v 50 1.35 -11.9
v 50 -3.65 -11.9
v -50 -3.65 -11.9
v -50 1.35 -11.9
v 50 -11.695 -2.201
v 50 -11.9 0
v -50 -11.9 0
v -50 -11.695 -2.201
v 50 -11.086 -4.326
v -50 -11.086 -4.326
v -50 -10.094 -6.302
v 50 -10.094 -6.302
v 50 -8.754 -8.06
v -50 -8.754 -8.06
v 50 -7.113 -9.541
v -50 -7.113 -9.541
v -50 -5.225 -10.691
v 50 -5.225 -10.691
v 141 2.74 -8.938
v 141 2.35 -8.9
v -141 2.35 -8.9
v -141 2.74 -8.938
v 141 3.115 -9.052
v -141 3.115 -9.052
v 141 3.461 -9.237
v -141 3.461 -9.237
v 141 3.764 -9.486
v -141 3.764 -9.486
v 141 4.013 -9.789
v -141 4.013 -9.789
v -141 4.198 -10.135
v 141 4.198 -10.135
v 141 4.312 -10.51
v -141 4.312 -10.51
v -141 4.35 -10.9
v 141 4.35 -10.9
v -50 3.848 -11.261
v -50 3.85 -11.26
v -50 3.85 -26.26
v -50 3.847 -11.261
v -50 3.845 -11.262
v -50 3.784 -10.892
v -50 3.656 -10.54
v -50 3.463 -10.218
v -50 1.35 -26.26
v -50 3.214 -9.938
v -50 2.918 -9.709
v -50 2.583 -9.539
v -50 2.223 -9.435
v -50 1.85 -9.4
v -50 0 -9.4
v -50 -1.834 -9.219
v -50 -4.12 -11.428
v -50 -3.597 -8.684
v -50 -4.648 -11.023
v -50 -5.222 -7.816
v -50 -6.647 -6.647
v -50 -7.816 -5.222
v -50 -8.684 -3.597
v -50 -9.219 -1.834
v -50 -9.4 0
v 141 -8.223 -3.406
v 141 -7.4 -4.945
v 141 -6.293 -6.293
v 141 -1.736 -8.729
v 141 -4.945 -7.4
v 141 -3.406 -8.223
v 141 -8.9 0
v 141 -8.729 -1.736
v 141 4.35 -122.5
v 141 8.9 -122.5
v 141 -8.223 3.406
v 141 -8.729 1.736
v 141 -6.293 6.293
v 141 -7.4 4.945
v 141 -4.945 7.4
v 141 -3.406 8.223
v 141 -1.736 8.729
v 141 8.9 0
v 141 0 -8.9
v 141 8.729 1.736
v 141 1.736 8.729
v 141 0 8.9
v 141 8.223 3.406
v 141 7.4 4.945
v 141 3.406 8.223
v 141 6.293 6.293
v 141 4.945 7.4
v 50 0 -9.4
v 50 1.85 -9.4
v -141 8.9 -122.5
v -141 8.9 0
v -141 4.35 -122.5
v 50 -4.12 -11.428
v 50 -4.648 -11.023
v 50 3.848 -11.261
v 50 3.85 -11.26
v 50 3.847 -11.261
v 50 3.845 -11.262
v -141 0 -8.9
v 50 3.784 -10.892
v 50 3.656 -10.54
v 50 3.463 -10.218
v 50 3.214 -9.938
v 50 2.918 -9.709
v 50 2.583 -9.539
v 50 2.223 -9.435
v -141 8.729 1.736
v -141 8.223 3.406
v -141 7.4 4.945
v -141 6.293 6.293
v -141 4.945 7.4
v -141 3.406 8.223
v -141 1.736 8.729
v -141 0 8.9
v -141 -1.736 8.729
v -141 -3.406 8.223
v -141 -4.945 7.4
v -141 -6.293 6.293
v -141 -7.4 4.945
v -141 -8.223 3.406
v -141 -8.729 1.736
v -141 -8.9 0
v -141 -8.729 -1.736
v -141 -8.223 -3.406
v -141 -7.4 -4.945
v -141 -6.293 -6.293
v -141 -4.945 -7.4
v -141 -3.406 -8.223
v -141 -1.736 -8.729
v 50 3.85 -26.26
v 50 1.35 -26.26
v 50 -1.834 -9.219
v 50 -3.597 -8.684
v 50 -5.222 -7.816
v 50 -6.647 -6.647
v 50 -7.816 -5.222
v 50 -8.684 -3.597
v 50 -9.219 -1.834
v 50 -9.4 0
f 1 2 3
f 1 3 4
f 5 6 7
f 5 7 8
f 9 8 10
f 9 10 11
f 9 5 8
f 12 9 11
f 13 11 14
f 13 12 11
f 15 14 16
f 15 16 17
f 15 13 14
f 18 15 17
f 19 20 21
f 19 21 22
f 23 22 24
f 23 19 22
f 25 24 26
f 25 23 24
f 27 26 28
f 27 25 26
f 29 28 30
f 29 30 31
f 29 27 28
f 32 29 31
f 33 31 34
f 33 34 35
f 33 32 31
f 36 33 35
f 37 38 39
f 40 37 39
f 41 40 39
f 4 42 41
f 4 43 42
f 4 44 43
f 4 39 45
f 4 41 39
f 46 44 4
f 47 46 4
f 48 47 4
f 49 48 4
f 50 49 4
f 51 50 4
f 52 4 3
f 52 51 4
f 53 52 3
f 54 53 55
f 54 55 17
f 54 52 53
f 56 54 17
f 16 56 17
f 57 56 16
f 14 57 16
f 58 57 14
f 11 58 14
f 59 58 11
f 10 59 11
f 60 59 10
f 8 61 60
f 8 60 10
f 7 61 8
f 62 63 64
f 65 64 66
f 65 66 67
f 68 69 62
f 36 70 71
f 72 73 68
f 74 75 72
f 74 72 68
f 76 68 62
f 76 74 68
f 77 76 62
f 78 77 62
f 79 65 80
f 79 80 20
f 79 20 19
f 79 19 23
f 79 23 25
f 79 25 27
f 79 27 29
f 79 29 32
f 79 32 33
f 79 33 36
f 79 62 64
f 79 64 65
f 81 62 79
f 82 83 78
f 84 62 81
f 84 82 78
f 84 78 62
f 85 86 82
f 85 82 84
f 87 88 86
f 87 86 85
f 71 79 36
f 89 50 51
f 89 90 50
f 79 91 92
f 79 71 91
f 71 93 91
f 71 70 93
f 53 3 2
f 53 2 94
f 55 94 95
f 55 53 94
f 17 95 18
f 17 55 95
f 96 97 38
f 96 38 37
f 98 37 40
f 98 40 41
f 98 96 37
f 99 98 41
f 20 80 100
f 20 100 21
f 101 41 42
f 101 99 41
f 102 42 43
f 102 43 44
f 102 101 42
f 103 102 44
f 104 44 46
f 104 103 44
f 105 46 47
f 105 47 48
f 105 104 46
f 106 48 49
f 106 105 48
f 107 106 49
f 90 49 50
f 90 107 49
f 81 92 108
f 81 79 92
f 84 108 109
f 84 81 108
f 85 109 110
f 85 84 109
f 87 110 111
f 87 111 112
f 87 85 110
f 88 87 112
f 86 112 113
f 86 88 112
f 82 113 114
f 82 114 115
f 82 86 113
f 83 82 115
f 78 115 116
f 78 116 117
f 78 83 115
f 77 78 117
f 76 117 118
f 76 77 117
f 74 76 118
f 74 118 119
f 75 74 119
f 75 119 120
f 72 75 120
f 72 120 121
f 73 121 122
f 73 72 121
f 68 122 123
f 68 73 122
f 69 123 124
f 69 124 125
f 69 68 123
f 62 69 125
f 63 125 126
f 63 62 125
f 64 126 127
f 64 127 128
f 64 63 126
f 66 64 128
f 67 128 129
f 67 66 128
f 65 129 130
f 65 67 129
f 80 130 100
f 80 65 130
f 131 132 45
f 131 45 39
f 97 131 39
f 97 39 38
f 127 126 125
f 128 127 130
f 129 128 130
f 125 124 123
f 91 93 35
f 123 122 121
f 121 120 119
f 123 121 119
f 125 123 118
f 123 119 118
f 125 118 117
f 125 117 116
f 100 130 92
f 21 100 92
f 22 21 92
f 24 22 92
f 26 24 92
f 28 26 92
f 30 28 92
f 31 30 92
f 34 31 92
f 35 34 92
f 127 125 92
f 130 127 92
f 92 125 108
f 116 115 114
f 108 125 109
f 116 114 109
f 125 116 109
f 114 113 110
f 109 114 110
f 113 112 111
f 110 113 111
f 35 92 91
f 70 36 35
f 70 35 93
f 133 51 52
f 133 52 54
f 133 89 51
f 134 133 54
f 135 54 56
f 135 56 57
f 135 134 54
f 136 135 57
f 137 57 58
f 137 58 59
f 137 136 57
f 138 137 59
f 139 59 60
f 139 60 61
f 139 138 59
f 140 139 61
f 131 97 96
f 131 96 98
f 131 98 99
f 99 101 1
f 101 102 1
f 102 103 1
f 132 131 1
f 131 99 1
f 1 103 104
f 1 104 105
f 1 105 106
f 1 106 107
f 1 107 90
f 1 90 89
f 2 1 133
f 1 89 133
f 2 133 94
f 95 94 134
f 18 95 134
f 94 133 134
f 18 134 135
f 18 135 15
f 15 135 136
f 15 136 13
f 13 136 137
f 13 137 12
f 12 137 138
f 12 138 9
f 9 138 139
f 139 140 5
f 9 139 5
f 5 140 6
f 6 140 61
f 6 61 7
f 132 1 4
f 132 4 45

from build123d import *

# Parameters (mm, degrees)
F1_DEPTH    = 141
F3_DEPTH    = 50
F4_T1_DEPTH = 100


# Not quite as in the source:
# - a fillet or chamfer that OpenCascade refuses, or shapes differently, is made with other operations: its cross-section is extruded or revolved along the edge and cut away or added


with BuildPart() as f1:
    # F0 (on Right) → F1 (new body, symmetric)
    with BuildSketch(Plane.YZ):
        with BuildLine():
            ThreePointArc((0, -8.9), (6.2932503526, -6.2932503526), (8.9, 0))
            ThreePointArc((8.9, 0), (-6.2932503526, 6.2932503526), (0, -8.9))
        make_face()
        with BuildLine():
            Line((8.9, -122.5), (8.9, 0))
            ThreePointArc((8.9, 0), (6.2932503526, -6.2932503526), (0, -8.9))
            Line((0, -8.9), (2.35, -8.9))
            ThreePointArc((2.35, -8.9), (3.7642135624, -9.4857864376), (4.35, -10.9))
            Line((4.35, -10.9), (4.35, -122.5))
            Line((4.35, -122.5), (8.9, -122.5))
        make_face()
    extrude(amount=F1_DEPTH, both=True)


with BuildPart() as f3:
    # F2 (on Right) → F3 (new body, symmetric)
    with BuildSketch(Plane.YZ):
        with BuildLine():
            ThreePointArc((0, -9.4), (-6.6468037432, -6.6468037432), (-9.4, 0))
            Line((-9.4, 0), (-11.9, 0))
            ThreePointArc((-11.9, 0), (-9.618861679, -7.0062472123), (-3.65, -11.3264071973))
            ThreePointArc((-3.65, -11.3264071973), (-1.8473974259, -11.7557272319), (-4.02e-08, -11.9))
            ThreePointArc((-4.02e-08, -11.9), (0.6760920348, -11.8807785755), (1.35, -11.8231763922))
            ThreePointArc((1.35, -11.8231763922), (2.6127340162, -11.6096348332), (3.8452078973, -11.2616329289))
            ThreePointArc((3.8452078973, -11.2616329289), (3.2144166992, -9.9376843463), (1.85, -9.4))
            Line((1.85, -9.4), (0, -9.4))
        make_face()
        with BuildLine():
            ThreePointArc((-4.02e-08, -11.9), (-1.8473974259, -11.7557272319), (-3.65, -11.3264071973))
            Line((-3.65, -11.3264071973), (-3.65, -11.9))
            Line((-3.65, -11.9), (-4.02e-08, -11.9))
        make_face()
        with BuildLine():
            ThreePointArc((3.85, -11.4), (3.8488016153, -11.3307749854), (3.8452078973, -11.2616329289))
            ThreePointArc((3.8452078973, -11.2616329289), (2.6127340162, -11.6096348332), (1.35, -11.8231763922))
            Line((1.35, -11.8231763922), (1.35, -11.9))
            Line((1.35, -11.9), (1.35, -26.2599955595))
            Line((1.35, -26.2599955595), (3.85, -26.2599955595))
            Line((3.85, -26.2599955595), (3.85, -11.4))
        make_face()
        with BuildLine():
            ThreePointArc((3.85, -11.2599955595), (3.8476040358, -11.2608144991), (3.8452078973, -11.2616329289))
            ThreePointArc((3.8452078973, -11.2616329289), (3.8488016153, -11.3307749854), (3.85, -11.4))
            Line((3.85, -11.4), (3.85, -11.2599955595))
        make_face()
        with BuildLine():
            ThreePointArc((1.35, -11.8231763922), (0.6760920348, -11.8807785755), (-4.02e-08, -11.9))
            Line((-4.02e-08, -11.9), (1.35, -11.9))
            Line((1.35, -11.9), (1.35, -11.8231763922))
        make_face()
    extrude(amount=F3_DEPTH, both=True)

    # F4: fillet of radius 5 on 1 edges, made by hand

    # F4_s2 → F4_t1 (join)
    with BuildSketch(Plane.YZ.offset(-50)):
        with BuildLine():
            ThreePointArc((-3.65, -11.9), (-4.3769843949, -11.2167783036), (-5.2251400827, -10.6914877878))
            ThreePointArc((-5.2251400827, -10.6914877878), (-4.4489109382, -11.0370825612), (-3.65, -11.3264071973))
            Line((-3.65, -11.3264071973), (-3.65, -11.9))
        make_face()
    extrude(amount=F4_T1_DEPTH)


solid = Compound([f1.part, f3.part])
